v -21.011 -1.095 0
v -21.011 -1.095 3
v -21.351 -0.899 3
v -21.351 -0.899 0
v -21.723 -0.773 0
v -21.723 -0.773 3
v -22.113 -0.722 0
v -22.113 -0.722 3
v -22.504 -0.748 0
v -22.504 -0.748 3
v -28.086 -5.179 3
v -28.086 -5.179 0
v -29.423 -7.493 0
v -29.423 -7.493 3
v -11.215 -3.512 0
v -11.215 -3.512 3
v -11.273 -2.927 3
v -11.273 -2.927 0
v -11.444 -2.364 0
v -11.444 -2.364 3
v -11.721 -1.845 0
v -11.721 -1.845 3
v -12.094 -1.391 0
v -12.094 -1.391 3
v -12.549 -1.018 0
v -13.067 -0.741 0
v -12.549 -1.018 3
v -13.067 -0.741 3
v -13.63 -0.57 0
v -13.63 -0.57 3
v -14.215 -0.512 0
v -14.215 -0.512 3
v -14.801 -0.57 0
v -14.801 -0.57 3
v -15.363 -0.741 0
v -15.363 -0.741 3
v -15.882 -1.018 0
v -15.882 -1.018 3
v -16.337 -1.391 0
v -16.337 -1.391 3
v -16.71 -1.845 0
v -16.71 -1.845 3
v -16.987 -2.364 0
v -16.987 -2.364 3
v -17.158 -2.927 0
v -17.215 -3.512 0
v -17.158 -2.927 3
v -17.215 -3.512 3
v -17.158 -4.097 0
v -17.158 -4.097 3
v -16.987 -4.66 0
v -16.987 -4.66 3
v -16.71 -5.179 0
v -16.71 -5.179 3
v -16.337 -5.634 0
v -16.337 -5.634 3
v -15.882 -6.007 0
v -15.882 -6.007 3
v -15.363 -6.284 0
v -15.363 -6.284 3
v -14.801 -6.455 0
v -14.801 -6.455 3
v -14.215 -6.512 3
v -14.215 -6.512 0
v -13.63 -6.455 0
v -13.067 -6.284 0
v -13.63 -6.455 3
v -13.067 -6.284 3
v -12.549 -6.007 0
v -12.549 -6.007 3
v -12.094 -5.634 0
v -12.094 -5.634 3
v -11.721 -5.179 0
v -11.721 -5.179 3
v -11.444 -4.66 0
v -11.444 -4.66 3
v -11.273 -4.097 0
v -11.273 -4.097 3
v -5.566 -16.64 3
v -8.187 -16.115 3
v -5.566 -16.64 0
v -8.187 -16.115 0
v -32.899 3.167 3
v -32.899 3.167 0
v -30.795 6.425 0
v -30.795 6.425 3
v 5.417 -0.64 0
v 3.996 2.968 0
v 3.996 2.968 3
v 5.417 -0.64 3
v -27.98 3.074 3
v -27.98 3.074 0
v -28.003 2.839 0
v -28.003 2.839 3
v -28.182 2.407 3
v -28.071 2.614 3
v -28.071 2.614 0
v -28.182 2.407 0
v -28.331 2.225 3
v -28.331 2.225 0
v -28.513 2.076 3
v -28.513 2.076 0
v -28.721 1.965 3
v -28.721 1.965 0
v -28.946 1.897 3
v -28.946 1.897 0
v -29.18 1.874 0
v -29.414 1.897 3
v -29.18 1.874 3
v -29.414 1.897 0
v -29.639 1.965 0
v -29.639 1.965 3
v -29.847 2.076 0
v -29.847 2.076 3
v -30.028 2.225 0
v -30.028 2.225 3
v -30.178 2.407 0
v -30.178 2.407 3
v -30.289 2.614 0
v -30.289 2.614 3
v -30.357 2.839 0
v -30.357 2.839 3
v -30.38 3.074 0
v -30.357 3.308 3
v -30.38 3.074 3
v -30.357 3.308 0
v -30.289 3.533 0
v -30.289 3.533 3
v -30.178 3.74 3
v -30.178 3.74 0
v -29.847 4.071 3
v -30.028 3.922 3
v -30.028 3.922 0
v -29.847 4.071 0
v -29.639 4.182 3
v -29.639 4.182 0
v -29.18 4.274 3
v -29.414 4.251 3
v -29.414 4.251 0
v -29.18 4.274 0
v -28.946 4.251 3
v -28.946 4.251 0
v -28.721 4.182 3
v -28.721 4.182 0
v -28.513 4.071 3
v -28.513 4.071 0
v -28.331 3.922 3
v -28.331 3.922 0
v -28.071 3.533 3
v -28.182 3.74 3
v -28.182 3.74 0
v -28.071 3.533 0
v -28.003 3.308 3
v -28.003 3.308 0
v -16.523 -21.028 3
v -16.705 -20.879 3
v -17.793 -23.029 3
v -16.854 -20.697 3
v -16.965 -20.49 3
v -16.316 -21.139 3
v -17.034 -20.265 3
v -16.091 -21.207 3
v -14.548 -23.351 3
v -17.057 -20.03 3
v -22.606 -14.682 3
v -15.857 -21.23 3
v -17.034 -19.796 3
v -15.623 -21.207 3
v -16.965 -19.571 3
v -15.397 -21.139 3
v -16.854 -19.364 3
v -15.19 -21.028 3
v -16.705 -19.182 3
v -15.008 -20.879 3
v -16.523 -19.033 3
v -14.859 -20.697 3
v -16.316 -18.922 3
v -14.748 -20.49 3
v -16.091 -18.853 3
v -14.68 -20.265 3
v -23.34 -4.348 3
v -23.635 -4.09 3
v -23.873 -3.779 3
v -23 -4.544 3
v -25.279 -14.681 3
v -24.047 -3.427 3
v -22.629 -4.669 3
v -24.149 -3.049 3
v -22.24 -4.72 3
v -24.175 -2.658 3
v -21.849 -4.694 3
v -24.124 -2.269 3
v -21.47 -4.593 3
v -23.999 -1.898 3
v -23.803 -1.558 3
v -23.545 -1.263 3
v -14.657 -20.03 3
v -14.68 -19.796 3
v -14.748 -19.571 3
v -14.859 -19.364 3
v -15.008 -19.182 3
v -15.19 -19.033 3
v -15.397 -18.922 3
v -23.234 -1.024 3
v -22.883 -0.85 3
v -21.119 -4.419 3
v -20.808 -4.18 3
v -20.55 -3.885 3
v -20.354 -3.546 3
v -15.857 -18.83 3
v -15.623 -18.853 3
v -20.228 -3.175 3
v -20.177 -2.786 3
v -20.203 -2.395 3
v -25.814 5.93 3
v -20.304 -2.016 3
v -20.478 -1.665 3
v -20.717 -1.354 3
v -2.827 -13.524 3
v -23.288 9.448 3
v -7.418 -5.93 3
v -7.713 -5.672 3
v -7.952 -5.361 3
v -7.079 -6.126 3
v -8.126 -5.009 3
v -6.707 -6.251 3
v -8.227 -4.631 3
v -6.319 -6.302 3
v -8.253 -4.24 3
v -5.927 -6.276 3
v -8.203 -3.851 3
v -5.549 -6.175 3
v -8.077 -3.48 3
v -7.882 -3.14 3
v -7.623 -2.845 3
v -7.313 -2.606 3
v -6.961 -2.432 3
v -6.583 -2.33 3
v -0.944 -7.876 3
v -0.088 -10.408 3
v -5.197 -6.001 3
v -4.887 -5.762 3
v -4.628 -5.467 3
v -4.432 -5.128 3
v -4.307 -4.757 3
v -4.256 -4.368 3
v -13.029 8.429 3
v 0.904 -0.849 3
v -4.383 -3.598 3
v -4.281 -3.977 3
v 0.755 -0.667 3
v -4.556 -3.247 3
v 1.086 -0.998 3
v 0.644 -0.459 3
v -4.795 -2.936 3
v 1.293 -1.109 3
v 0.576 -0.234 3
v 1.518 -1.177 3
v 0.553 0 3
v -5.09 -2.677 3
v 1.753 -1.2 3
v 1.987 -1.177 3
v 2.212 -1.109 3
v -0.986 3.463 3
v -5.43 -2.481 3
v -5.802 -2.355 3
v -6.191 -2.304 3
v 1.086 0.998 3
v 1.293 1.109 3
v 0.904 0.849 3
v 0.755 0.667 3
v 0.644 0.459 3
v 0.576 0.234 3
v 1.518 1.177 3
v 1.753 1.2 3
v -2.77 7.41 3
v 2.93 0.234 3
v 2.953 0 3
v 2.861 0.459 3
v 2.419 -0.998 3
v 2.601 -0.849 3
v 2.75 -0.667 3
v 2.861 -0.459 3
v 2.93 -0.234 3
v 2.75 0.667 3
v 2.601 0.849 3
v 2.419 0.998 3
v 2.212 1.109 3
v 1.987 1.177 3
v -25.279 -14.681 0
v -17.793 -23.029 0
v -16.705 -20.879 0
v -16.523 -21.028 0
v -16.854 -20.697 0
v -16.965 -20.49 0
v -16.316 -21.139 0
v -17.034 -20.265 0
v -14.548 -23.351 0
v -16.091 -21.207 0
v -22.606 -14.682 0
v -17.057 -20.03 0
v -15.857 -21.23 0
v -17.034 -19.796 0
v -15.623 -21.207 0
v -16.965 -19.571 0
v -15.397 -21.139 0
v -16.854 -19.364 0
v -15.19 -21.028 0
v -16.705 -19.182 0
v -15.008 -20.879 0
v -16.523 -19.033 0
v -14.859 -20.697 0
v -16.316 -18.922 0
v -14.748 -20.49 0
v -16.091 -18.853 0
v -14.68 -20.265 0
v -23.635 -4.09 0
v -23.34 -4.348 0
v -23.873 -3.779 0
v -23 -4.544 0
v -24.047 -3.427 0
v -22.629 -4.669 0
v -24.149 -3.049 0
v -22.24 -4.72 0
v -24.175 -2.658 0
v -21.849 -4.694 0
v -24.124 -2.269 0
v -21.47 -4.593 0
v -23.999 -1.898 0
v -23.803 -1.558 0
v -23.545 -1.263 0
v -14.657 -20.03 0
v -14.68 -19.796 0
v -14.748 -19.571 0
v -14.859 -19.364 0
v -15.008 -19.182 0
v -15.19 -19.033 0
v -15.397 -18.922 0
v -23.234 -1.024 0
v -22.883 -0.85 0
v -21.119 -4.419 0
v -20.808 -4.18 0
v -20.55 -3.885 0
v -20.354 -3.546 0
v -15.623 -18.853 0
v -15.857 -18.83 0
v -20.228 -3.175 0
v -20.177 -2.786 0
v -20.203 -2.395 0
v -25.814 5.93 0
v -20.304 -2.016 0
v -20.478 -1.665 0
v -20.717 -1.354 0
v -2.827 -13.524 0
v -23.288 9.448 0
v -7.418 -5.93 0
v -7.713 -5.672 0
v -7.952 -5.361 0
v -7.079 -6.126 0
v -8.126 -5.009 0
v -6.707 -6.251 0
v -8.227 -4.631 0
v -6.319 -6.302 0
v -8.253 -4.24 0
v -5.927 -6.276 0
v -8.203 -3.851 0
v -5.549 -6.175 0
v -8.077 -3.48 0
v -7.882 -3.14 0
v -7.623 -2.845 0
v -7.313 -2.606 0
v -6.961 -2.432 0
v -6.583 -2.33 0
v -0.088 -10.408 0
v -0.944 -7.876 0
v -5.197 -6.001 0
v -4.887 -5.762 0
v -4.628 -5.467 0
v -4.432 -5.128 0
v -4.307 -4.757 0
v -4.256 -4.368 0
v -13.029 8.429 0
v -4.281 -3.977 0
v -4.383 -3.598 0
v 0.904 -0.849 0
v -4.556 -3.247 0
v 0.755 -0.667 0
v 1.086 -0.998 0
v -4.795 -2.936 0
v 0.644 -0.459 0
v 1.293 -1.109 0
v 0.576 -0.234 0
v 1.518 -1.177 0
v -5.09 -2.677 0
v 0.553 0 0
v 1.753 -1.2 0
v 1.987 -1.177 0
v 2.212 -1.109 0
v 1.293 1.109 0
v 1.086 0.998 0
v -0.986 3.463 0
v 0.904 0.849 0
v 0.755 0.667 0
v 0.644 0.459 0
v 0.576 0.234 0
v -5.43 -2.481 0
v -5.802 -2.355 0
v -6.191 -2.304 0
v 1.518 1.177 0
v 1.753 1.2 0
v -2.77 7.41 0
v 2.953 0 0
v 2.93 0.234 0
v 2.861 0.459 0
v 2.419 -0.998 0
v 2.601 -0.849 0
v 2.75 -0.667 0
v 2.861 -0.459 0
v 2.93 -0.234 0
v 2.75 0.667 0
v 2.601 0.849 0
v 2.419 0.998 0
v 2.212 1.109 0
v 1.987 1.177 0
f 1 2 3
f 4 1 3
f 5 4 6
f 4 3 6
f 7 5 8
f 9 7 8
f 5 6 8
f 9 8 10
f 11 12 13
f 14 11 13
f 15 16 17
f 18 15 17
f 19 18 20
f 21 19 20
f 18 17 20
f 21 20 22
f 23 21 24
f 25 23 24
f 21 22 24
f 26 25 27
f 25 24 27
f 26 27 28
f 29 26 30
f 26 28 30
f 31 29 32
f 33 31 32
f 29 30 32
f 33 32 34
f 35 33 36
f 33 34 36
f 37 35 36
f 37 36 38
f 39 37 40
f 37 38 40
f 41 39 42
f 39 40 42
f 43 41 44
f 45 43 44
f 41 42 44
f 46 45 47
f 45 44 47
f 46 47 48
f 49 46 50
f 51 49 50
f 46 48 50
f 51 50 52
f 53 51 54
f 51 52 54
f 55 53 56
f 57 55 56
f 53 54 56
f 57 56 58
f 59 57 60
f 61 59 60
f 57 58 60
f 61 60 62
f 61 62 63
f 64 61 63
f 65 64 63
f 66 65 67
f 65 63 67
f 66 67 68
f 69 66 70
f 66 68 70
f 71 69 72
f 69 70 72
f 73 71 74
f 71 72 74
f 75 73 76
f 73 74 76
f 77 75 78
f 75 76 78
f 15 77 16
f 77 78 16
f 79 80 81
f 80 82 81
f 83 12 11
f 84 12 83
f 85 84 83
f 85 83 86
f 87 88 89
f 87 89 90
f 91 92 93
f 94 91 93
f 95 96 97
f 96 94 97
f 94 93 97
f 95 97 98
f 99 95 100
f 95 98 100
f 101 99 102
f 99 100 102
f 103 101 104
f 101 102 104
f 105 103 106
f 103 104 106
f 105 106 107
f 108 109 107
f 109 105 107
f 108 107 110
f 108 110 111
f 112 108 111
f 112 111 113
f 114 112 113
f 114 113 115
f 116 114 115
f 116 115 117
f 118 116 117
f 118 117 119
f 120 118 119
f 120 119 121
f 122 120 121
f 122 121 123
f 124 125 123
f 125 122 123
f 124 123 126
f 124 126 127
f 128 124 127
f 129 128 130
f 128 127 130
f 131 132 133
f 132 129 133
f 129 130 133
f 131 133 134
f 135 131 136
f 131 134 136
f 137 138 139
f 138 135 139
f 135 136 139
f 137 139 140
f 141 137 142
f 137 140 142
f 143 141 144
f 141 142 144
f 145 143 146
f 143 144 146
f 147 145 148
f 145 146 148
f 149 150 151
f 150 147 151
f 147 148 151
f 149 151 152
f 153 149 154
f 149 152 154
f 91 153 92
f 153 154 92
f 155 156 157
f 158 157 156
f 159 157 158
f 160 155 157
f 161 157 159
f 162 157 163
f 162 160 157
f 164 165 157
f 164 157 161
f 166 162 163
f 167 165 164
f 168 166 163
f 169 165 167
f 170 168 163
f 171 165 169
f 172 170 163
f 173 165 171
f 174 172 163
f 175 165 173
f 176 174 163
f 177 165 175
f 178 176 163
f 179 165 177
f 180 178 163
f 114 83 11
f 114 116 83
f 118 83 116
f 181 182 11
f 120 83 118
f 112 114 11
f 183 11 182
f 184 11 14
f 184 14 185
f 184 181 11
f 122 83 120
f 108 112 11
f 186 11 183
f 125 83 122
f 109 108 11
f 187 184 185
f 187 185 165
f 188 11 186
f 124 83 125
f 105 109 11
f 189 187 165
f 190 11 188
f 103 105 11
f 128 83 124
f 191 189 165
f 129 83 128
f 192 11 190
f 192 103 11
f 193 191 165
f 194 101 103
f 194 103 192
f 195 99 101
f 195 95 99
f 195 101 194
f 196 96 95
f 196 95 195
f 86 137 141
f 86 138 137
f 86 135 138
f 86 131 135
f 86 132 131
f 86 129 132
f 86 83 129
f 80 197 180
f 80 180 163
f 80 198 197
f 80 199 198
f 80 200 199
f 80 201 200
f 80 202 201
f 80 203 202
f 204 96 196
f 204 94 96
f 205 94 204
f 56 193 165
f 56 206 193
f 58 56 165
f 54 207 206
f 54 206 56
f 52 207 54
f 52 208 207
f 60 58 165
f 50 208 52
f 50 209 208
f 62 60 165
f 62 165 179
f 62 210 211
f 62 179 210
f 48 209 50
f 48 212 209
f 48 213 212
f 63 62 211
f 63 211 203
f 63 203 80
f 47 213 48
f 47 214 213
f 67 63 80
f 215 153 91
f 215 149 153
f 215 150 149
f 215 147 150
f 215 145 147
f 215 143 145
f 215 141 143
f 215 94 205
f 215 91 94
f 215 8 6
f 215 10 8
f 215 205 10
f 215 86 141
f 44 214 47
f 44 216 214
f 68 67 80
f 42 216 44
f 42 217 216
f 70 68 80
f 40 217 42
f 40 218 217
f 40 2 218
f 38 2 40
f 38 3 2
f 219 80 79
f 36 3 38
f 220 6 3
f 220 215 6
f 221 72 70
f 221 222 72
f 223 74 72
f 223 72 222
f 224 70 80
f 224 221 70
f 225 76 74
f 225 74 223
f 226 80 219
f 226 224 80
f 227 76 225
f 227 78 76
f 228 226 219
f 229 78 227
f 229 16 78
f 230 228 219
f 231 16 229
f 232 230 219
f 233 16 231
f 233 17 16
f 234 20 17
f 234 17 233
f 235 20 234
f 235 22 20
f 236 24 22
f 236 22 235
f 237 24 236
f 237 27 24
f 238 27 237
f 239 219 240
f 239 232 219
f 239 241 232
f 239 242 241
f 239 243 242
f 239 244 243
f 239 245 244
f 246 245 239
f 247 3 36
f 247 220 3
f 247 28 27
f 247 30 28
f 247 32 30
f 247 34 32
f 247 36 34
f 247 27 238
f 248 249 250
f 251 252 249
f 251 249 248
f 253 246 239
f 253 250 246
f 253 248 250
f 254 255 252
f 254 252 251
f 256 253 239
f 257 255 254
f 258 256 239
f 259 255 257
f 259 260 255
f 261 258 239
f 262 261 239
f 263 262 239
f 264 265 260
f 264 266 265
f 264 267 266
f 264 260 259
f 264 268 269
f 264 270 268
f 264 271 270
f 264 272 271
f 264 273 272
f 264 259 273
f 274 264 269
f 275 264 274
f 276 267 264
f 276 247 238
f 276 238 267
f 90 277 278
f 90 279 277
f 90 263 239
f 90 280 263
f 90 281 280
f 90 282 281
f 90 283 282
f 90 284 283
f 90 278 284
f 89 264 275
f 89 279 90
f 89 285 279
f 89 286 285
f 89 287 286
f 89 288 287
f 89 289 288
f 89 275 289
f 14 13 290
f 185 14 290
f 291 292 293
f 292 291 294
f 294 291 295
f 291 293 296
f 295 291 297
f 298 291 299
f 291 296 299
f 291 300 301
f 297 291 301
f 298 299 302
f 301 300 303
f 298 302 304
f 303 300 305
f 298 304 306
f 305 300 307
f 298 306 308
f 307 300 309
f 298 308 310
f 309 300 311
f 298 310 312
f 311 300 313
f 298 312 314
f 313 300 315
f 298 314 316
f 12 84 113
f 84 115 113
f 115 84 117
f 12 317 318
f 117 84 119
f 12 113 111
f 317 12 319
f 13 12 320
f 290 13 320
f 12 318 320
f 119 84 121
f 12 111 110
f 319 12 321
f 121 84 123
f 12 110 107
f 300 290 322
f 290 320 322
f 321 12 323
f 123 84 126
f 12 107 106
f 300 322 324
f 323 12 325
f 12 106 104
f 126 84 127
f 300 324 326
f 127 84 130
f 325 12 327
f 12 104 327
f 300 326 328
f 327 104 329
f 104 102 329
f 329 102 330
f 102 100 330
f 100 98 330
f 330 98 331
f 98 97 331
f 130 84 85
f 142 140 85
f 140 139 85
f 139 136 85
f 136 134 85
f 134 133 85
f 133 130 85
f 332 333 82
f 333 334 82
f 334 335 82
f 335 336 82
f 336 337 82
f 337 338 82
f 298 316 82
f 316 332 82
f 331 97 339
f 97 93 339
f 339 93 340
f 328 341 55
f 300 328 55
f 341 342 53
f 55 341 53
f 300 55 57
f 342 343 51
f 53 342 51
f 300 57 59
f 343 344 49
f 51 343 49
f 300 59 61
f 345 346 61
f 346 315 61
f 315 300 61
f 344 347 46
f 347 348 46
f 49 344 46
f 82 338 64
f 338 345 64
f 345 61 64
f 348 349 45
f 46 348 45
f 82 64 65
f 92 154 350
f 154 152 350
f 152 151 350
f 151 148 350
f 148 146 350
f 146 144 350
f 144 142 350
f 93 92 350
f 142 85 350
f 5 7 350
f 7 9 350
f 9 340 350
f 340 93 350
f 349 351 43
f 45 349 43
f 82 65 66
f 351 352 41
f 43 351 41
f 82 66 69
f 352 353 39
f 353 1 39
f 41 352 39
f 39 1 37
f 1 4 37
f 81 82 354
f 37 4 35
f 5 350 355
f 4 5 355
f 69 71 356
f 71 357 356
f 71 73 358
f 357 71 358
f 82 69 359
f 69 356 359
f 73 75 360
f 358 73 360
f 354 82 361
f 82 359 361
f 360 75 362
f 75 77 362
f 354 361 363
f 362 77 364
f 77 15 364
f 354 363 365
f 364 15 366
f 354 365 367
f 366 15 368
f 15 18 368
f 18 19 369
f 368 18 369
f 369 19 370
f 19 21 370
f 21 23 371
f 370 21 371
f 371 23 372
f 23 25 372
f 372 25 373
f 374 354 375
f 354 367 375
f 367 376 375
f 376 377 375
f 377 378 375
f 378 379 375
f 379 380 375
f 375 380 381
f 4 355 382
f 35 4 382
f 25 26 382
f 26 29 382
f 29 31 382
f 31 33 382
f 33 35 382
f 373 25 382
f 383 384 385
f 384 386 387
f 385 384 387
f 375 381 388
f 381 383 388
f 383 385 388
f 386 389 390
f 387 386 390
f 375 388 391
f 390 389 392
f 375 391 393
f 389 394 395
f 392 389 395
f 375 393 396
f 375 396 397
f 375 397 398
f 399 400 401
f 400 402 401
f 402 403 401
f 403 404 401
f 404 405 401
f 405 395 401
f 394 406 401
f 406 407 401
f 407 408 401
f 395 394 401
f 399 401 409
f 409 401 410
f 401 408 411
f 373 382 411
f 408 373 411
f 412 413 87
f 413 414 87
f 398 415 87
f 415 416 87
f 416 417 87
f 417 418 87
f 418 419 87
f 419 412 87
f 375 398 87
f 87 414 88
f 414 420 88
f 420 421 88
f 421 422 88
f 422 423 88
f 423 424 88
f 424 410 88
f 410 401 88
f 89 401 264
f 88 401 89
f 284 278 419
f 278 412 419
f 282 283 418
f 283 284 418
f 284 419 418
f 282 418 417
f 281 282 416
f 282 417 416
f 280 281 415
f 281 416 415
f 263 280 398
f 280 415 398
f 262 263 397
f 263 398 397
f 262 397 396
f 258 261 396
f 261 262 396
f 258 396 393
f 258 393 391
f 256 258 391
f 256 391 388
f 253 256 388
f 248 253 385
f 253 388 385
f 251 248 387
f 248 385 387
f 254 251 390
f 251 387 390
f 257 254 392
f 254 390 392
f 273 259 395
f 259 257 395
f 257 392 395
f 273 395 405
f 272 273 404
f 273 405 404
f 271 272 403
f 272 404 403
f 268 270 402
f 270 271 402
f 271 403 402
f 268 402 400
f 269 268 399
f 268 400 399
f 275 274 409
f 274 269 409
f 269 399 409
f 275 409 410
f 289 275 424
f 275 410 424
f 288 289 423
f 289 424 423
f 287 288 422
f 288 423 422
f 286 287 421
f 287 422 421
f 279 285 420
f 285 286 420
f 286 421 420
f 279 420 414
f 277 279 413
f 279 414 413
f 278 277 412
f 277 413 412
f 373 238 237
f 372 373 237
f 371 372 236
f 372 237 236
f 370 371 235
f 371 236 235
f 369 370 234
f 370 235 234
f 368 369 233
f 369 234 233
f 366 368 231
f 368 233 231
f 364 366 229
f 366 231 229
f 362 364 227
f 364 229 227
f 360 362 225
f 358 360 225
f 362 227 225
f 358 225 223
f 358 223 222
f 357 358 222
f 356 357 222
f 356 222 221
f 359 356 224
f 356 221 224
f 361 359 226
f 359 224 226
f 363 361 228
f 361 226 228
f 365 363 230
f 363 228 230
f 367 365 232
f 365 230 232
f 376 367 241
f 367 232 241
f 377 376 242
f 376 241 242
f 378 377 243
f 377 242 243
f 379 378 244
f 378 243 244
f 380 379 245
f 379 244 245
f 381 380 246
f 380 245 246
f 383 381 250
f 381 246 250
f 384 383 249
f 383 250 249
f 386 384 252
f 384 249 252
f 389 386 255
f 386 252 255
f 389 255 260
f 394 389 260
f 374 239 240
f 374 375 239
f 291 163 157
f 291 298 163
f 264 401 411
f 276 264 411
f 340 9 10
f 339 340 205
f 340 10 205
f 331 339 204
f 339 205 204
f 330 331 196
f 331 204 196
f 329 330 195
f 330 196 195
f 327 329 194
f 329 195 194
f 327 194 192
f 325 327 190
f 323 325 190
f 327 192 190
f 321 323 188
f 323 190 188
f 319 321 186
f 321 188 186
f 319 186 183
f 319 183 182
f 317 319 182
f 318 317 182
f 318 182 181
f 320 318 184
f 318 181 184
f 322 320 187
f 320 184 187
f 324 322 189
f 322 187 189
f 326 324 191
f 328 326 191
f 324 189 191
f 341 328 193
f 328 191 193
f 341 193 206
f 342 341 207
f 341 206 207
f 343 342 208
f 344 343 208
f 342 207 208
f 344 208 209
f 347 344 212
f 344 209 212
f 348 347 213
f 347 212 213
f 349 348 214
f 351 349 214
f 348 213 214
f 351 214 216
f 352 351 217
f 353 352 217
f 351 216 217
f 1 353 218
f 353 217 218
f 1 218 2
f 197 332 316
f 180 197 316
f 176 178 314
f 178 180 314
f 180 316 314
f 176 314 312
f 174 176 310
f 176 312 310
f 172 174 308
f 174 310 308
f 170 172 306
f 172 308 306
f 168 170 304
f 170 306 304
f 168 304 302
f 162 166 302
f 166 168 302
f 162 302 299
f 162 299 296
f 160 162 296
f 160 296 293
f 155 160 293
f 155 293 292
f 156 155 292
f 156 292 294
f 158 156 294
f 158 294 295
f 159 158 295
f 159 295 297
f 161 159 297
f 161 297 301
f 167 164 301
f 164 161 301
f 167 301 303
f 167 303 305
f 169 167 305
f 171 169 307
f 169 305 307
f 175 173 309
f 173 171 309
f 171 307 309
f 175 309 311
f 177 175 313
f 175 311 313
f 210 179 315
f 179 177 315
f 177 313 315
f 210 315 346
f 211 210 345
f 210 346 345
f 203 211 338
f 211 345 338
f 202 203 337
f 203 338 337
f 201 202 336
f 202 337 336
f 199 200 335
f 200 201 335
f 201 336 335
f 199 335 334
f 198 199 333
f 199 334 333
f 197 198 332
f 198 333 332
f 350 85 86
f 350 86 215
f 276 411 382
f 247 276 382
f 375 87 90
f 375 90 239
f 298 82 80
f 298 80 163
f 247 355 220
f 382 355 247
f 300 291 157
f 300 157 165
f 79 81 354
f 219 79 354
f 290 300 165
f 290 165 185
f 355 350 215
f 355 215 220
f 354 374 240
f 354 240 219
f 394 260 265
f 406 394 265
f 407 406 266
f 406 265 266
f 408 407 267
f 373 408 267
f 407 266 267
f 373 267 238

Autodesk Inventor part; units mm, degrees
ref_plane "YZ Plane" through (0, 0, 0) normal (1, 0, 0) x (0, 1, 0)
ref_plane "XZ Plane" through (0, 0, 0) normal (0, 1, 0) x (-1, 0, 0)
ref_plane "XY Plane" through (0, 0, 0) normal (0, 0, 1) x (1, 0, 0)
sketch "Sketch1" plane through (0, 0, 0) normal (0, 0, 1) x (1, 0, 0)
  circle A0 centre (-29.1799, 3.0736) radius 3.175 construction
  circle A1 centre (1.7526, 0) radius 3.175 construction
  circle A2 centre (-15.8567, -20.0304) radius 3.175 construction
  circle A3 centre (-29.1799, 3.0736) radius 1.2
  circle A4 centre (1.7526, 0) radius 1.2
  circle A5 centre (-15.8567, -20.0304) radius 1.2
  line L0 (-29.1799, 3.0736) -> (1.7526, 0) construction
  line L1 (-13.7137, 1.5368) -> (-15.8567, -20.0304) construction
  line L2 (-30.7954, 6.4247) -> (3.9959, 2.9677)
  line L3 (3.9959, 2.9677) -> (5.4173, -0.6401)
  line L4 (5.4173, -0.6401) -> (-14.5484, -23.3511)
  line L5 (-14.5484, -23.3511) -> (-17.7927, -23.0287)
  line L6 (-17.7927, -23.0287) -> (-32.899, 3.1671)
  line L7 (-32.899, 3.1671) -> (-30.7954, 6.4247)
  point P0 (0, 0)
  point P1 (-16.1706, -23.1899)
  point P2 (-31.8472, 4.7959)
  dimension "d0" = 2.4
  dimension "d1" = 2.4
  dimension "d2" = 2.4
extrude "Plate1" add sketch "Sketch1" along normal blind 3
sketch "Sketch2" plane through (0, 0, 3) normal (0, 0, 1) x (1, 0, 0)
  line L0 (-17.7927, -23.0287) -> (-32.899, 3.1671) construction
  line L1 (-30.7954, 6.4247) -> (3.9959, 2.9677) construction
  line L2 (5.4173, -0.6401) -> (-14.5484, -23.3511) construction
  line L3 (-17.7927, -23.0287) -> (-32.899, 3.1671) construction
  line L4 (-25.3459, -9.9308) -> (-14.2154, -3.5122) construction
  line L5 (-14.2154, -3.5122) -> (-13.3997, 4.6962) construction
  line L6 (-14.2154, -3.5122) -> (-4.5656, -11.9956) construction
  line L7 (5.4173, -0.6401) -> (-14.5484, -23.3511) construction
  point P0 (0, 0)
sketch "Sketch3" plane through (0, 0, 3) normal (0, 0, 1) x (1, 0, 0)
  arc A0 (-5.0898, -2.6774) -> (-6.5829, -2.3304) centre (-6.2546, -4.3032) ccw projected
  arc A1 (-6.5829, -2.3304) -> (-5.0898, -2.6774) centre (-6.2546, -4.3032) ccw projected
  arc A2 (-21.0113, -1.0954) -> (-22.5045, -0.7484) centre (-22.1762, -2.7212) ccw projected
  arc A3 (-22.5045, -0.7484) -> (-21.0113, -1.0954) centre (-22.1762, -2.7212) ccw projected
  circle A4 centre (-14.2154, -3.5122) radius 3 projected
extrude "Extrusion1" cut sketch "Sketch3" against normal through all
sketch "Sketch4" plane through (0, 0, 0) normal (0, 0, -1) x (-1, 0, 0)
  line L0 (30.7954, 6.4247) -> (-3.9959, 2.9677) projected
  line L1 (0.9857, 3.4627) -> (2.77, 7.4096)
  line L2 (2.77, 7.4096) -> (13.0288, 8.429)
  line L3 (13.0288, 8.429) -> (13.3997, 4.6962) construction
  arc A0 (9.3955, 4.3921) -> (1.4831, 3.2621) centre (5.4635, 3.6576) ccw construction
  line L4 (25.8137, 5.9297) -> (23.2877, 9.4483)
  line L5 (23.2877, 9.4483) -> (13.0288, 8.429)
  line L6 (-5.4173, -0.6401) -> (14.5484, -23.3511) projected
  line L7 (0.9442, -7.8763) -> (0.0881, -10.4082)
  line L8 (0.0881, -10.4082) -> (2.8272, -13.5239)
  line L9 (2.8272, -13.5239) -> (4.5656, -11.9956) construction
  line L10 (-5.4173, -0.6401) -> (14.5484, -23.3511) projected
  arc A1 (3.0652, -12.6595) -> (11.0452, -12.2104) centre (7.0456, -12.264) ccw construction
  line L11 (8.1869, -16.1149) -> (5.5662, -16.6395)
  line L12 (5.5662, -16.6395) -> (2.8272, -13.5239)
  line L13 (17.7927, -23.0287) -> (32.899, 3.1671) projected
  line L14 (28.0858, -5.1794) -> (29.4234, -7.4934)
  line L15 (29.4234, -7.4934) -> (27.351, -11.0871)
  line L16 (25.2786, -14.6808) -> (27.351, -11.0871)
  line L17 (22.6059, -14.6822) -> (25.2786, -14.6808)
  point P0 (0, 0)
  dimension "d6" = 120
  dimension "d7" = 120
extrude "Extrusion2" add sketch "Sketch4" against normal up to surface (3 mm away)
equation "\"d3\" = Thickness"
equation "\"BendRadius\" = Thickness"
equation "\"BendReliefWidth\" = Thickness"
equation "\"BendReliefDepth\" = 0.5 * Thickness"
equation "\"CornerReliefSize\" = 4 * Thickness"
equation "\"MinimumRemnant\" = 2 * Thickness"
equation "\"TransitionRadius\" = BendRadius"
equation "\"JacobiRadiusSize\" = BendRadius"
equation "\"GapSize\" = Thickness"
equation "\"Thickness\" = 3"
properties part number "TongueMount"
